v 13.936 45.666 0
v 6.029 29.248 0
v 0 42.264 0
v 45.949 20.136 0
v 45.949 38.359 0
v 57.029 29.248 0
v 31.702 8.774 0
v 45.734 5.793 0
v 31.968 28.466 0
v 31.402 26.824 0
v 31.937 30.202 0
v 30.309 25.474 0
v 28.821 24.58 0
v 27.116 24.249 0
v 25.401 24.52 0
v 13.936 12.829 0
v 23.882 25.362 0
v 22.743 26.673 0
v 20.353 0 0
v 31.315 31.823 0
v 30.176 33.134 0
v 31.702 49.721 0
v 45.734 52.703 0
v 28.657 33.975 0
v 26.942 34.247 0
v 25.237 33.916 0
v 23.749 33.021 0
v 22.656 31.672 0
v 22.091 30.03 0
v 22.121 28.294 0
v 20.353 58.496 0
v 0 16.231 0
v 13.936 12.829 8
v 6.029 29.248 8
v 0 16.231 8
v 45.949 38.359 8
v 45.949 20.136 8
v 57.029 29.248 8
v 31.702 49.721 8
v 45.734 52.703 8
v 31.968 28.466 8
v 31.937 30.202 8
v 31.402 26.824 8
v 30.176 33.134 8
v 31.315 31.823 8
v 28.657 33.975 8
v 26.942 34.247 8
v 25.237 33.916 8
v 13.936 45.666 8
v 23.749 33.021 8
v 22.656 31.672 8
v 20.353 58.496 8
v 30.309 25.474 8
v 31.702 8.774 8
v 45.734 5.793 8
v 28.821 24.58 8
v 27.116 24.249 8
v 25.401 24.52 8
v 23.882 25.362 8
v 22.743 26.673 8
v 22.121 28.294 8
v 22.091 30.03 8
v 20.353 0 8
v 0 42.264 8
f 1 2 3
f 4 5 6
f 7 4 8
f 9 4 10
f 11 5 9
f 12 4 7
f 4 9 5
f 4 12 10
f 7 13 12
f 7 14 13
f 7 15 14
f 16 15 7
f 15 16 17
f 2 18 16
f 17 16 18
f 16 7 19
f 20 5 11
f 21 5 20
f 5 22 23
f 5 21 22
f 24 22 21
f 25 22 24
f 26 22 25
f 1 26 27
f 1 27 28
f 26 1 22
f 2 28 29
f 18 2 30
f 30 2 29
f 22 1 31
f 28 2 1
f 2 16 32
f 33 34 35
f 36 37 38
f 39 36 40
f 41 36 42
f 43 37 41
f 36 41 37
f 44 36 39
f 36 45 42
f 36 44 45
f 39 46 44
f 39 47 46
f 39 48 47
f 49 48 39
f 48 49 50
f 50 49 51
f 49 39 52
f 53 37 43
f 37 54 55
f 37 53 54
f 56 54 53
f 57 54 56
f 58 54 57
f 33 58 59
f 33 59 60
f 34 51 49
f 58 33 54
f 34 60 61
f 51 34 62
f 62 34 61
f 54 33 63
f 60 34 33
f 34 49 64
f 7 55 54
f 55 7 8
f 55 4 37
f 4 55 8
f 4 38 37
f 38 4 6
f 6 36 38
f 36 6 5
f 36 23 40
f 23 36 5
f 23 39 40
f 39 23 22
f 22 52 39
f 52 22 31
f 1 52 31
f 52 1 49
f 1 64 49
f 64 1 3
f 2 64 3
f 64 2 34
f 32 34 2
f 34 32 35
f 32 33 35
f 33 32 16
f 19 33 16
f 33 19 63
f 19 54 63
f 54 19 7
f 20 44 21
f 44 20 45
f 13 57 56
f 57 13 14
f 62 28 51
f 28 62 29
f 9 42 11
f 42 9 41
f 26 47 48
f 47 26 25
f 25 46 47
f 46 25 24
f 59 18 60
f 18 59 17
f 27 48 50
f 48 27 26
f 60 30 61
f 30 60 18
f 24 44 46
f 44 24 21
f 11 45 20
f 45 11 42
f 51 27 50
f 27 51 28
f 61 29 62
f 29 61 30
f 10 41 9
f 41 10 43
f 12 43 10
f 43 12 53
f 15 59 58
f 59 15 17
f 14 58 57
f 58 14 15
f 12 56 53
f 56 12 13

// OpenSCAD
$fn = 32;

// ----------------------------------------------------------------------
// Star wheel: 7-point blunt, R30
// ----------------------------------------------------------------------

// --- parameters (mm) ---
n_points = 7;             // number of points / teeth
r_out = 30;               // tip radius
r_in = 21;                // root radius
bore_r = 5;               // centre bore radius
plate_t = 8;              // plate thickness, Z (extrusion height)
bore_d = 10;              // centre bore diameter

profile = [[57.029, 29.248], [45.949, 38.359], [45.734, 52.703], [31.702, 49.721], [20.353, 58.496], [13.936, 45.666], [0, 42.264], [6.029, 29.248], [0, 16.231], [13.936, 12.829], [20.353, 0], [31.702, 8.774], [45.734, 5.793], [45.949, 20.136]];  // primary outline, 14 points, counter clockwise
void_1 = [[31.937, 30.202], [31.315, 31.823], [30.176, 33.134], [28.657, 33.975], [26.942, 34.247], [25.237, 33.916], [23.749, 33.021], [22.656, 31.672], [22.091, 30.03], [22.121, 28.294], [22.743, 26.673], [23.882, 25.362], [25.401, 24.52], [27.116, 24.249], [28.821, 24.58], [30.309, 25.474], [31.402, 26.824], [31.968, 28.466]];  // centre bore, 18 points

// --- the one profile operation ---
difference() {
  linear_extrude(height = plate_t) polygon(points = profile);
  translate([0, 0, -1])
    linear_extrude(height = plate_t + 2) polygon(points = void_1);
}
